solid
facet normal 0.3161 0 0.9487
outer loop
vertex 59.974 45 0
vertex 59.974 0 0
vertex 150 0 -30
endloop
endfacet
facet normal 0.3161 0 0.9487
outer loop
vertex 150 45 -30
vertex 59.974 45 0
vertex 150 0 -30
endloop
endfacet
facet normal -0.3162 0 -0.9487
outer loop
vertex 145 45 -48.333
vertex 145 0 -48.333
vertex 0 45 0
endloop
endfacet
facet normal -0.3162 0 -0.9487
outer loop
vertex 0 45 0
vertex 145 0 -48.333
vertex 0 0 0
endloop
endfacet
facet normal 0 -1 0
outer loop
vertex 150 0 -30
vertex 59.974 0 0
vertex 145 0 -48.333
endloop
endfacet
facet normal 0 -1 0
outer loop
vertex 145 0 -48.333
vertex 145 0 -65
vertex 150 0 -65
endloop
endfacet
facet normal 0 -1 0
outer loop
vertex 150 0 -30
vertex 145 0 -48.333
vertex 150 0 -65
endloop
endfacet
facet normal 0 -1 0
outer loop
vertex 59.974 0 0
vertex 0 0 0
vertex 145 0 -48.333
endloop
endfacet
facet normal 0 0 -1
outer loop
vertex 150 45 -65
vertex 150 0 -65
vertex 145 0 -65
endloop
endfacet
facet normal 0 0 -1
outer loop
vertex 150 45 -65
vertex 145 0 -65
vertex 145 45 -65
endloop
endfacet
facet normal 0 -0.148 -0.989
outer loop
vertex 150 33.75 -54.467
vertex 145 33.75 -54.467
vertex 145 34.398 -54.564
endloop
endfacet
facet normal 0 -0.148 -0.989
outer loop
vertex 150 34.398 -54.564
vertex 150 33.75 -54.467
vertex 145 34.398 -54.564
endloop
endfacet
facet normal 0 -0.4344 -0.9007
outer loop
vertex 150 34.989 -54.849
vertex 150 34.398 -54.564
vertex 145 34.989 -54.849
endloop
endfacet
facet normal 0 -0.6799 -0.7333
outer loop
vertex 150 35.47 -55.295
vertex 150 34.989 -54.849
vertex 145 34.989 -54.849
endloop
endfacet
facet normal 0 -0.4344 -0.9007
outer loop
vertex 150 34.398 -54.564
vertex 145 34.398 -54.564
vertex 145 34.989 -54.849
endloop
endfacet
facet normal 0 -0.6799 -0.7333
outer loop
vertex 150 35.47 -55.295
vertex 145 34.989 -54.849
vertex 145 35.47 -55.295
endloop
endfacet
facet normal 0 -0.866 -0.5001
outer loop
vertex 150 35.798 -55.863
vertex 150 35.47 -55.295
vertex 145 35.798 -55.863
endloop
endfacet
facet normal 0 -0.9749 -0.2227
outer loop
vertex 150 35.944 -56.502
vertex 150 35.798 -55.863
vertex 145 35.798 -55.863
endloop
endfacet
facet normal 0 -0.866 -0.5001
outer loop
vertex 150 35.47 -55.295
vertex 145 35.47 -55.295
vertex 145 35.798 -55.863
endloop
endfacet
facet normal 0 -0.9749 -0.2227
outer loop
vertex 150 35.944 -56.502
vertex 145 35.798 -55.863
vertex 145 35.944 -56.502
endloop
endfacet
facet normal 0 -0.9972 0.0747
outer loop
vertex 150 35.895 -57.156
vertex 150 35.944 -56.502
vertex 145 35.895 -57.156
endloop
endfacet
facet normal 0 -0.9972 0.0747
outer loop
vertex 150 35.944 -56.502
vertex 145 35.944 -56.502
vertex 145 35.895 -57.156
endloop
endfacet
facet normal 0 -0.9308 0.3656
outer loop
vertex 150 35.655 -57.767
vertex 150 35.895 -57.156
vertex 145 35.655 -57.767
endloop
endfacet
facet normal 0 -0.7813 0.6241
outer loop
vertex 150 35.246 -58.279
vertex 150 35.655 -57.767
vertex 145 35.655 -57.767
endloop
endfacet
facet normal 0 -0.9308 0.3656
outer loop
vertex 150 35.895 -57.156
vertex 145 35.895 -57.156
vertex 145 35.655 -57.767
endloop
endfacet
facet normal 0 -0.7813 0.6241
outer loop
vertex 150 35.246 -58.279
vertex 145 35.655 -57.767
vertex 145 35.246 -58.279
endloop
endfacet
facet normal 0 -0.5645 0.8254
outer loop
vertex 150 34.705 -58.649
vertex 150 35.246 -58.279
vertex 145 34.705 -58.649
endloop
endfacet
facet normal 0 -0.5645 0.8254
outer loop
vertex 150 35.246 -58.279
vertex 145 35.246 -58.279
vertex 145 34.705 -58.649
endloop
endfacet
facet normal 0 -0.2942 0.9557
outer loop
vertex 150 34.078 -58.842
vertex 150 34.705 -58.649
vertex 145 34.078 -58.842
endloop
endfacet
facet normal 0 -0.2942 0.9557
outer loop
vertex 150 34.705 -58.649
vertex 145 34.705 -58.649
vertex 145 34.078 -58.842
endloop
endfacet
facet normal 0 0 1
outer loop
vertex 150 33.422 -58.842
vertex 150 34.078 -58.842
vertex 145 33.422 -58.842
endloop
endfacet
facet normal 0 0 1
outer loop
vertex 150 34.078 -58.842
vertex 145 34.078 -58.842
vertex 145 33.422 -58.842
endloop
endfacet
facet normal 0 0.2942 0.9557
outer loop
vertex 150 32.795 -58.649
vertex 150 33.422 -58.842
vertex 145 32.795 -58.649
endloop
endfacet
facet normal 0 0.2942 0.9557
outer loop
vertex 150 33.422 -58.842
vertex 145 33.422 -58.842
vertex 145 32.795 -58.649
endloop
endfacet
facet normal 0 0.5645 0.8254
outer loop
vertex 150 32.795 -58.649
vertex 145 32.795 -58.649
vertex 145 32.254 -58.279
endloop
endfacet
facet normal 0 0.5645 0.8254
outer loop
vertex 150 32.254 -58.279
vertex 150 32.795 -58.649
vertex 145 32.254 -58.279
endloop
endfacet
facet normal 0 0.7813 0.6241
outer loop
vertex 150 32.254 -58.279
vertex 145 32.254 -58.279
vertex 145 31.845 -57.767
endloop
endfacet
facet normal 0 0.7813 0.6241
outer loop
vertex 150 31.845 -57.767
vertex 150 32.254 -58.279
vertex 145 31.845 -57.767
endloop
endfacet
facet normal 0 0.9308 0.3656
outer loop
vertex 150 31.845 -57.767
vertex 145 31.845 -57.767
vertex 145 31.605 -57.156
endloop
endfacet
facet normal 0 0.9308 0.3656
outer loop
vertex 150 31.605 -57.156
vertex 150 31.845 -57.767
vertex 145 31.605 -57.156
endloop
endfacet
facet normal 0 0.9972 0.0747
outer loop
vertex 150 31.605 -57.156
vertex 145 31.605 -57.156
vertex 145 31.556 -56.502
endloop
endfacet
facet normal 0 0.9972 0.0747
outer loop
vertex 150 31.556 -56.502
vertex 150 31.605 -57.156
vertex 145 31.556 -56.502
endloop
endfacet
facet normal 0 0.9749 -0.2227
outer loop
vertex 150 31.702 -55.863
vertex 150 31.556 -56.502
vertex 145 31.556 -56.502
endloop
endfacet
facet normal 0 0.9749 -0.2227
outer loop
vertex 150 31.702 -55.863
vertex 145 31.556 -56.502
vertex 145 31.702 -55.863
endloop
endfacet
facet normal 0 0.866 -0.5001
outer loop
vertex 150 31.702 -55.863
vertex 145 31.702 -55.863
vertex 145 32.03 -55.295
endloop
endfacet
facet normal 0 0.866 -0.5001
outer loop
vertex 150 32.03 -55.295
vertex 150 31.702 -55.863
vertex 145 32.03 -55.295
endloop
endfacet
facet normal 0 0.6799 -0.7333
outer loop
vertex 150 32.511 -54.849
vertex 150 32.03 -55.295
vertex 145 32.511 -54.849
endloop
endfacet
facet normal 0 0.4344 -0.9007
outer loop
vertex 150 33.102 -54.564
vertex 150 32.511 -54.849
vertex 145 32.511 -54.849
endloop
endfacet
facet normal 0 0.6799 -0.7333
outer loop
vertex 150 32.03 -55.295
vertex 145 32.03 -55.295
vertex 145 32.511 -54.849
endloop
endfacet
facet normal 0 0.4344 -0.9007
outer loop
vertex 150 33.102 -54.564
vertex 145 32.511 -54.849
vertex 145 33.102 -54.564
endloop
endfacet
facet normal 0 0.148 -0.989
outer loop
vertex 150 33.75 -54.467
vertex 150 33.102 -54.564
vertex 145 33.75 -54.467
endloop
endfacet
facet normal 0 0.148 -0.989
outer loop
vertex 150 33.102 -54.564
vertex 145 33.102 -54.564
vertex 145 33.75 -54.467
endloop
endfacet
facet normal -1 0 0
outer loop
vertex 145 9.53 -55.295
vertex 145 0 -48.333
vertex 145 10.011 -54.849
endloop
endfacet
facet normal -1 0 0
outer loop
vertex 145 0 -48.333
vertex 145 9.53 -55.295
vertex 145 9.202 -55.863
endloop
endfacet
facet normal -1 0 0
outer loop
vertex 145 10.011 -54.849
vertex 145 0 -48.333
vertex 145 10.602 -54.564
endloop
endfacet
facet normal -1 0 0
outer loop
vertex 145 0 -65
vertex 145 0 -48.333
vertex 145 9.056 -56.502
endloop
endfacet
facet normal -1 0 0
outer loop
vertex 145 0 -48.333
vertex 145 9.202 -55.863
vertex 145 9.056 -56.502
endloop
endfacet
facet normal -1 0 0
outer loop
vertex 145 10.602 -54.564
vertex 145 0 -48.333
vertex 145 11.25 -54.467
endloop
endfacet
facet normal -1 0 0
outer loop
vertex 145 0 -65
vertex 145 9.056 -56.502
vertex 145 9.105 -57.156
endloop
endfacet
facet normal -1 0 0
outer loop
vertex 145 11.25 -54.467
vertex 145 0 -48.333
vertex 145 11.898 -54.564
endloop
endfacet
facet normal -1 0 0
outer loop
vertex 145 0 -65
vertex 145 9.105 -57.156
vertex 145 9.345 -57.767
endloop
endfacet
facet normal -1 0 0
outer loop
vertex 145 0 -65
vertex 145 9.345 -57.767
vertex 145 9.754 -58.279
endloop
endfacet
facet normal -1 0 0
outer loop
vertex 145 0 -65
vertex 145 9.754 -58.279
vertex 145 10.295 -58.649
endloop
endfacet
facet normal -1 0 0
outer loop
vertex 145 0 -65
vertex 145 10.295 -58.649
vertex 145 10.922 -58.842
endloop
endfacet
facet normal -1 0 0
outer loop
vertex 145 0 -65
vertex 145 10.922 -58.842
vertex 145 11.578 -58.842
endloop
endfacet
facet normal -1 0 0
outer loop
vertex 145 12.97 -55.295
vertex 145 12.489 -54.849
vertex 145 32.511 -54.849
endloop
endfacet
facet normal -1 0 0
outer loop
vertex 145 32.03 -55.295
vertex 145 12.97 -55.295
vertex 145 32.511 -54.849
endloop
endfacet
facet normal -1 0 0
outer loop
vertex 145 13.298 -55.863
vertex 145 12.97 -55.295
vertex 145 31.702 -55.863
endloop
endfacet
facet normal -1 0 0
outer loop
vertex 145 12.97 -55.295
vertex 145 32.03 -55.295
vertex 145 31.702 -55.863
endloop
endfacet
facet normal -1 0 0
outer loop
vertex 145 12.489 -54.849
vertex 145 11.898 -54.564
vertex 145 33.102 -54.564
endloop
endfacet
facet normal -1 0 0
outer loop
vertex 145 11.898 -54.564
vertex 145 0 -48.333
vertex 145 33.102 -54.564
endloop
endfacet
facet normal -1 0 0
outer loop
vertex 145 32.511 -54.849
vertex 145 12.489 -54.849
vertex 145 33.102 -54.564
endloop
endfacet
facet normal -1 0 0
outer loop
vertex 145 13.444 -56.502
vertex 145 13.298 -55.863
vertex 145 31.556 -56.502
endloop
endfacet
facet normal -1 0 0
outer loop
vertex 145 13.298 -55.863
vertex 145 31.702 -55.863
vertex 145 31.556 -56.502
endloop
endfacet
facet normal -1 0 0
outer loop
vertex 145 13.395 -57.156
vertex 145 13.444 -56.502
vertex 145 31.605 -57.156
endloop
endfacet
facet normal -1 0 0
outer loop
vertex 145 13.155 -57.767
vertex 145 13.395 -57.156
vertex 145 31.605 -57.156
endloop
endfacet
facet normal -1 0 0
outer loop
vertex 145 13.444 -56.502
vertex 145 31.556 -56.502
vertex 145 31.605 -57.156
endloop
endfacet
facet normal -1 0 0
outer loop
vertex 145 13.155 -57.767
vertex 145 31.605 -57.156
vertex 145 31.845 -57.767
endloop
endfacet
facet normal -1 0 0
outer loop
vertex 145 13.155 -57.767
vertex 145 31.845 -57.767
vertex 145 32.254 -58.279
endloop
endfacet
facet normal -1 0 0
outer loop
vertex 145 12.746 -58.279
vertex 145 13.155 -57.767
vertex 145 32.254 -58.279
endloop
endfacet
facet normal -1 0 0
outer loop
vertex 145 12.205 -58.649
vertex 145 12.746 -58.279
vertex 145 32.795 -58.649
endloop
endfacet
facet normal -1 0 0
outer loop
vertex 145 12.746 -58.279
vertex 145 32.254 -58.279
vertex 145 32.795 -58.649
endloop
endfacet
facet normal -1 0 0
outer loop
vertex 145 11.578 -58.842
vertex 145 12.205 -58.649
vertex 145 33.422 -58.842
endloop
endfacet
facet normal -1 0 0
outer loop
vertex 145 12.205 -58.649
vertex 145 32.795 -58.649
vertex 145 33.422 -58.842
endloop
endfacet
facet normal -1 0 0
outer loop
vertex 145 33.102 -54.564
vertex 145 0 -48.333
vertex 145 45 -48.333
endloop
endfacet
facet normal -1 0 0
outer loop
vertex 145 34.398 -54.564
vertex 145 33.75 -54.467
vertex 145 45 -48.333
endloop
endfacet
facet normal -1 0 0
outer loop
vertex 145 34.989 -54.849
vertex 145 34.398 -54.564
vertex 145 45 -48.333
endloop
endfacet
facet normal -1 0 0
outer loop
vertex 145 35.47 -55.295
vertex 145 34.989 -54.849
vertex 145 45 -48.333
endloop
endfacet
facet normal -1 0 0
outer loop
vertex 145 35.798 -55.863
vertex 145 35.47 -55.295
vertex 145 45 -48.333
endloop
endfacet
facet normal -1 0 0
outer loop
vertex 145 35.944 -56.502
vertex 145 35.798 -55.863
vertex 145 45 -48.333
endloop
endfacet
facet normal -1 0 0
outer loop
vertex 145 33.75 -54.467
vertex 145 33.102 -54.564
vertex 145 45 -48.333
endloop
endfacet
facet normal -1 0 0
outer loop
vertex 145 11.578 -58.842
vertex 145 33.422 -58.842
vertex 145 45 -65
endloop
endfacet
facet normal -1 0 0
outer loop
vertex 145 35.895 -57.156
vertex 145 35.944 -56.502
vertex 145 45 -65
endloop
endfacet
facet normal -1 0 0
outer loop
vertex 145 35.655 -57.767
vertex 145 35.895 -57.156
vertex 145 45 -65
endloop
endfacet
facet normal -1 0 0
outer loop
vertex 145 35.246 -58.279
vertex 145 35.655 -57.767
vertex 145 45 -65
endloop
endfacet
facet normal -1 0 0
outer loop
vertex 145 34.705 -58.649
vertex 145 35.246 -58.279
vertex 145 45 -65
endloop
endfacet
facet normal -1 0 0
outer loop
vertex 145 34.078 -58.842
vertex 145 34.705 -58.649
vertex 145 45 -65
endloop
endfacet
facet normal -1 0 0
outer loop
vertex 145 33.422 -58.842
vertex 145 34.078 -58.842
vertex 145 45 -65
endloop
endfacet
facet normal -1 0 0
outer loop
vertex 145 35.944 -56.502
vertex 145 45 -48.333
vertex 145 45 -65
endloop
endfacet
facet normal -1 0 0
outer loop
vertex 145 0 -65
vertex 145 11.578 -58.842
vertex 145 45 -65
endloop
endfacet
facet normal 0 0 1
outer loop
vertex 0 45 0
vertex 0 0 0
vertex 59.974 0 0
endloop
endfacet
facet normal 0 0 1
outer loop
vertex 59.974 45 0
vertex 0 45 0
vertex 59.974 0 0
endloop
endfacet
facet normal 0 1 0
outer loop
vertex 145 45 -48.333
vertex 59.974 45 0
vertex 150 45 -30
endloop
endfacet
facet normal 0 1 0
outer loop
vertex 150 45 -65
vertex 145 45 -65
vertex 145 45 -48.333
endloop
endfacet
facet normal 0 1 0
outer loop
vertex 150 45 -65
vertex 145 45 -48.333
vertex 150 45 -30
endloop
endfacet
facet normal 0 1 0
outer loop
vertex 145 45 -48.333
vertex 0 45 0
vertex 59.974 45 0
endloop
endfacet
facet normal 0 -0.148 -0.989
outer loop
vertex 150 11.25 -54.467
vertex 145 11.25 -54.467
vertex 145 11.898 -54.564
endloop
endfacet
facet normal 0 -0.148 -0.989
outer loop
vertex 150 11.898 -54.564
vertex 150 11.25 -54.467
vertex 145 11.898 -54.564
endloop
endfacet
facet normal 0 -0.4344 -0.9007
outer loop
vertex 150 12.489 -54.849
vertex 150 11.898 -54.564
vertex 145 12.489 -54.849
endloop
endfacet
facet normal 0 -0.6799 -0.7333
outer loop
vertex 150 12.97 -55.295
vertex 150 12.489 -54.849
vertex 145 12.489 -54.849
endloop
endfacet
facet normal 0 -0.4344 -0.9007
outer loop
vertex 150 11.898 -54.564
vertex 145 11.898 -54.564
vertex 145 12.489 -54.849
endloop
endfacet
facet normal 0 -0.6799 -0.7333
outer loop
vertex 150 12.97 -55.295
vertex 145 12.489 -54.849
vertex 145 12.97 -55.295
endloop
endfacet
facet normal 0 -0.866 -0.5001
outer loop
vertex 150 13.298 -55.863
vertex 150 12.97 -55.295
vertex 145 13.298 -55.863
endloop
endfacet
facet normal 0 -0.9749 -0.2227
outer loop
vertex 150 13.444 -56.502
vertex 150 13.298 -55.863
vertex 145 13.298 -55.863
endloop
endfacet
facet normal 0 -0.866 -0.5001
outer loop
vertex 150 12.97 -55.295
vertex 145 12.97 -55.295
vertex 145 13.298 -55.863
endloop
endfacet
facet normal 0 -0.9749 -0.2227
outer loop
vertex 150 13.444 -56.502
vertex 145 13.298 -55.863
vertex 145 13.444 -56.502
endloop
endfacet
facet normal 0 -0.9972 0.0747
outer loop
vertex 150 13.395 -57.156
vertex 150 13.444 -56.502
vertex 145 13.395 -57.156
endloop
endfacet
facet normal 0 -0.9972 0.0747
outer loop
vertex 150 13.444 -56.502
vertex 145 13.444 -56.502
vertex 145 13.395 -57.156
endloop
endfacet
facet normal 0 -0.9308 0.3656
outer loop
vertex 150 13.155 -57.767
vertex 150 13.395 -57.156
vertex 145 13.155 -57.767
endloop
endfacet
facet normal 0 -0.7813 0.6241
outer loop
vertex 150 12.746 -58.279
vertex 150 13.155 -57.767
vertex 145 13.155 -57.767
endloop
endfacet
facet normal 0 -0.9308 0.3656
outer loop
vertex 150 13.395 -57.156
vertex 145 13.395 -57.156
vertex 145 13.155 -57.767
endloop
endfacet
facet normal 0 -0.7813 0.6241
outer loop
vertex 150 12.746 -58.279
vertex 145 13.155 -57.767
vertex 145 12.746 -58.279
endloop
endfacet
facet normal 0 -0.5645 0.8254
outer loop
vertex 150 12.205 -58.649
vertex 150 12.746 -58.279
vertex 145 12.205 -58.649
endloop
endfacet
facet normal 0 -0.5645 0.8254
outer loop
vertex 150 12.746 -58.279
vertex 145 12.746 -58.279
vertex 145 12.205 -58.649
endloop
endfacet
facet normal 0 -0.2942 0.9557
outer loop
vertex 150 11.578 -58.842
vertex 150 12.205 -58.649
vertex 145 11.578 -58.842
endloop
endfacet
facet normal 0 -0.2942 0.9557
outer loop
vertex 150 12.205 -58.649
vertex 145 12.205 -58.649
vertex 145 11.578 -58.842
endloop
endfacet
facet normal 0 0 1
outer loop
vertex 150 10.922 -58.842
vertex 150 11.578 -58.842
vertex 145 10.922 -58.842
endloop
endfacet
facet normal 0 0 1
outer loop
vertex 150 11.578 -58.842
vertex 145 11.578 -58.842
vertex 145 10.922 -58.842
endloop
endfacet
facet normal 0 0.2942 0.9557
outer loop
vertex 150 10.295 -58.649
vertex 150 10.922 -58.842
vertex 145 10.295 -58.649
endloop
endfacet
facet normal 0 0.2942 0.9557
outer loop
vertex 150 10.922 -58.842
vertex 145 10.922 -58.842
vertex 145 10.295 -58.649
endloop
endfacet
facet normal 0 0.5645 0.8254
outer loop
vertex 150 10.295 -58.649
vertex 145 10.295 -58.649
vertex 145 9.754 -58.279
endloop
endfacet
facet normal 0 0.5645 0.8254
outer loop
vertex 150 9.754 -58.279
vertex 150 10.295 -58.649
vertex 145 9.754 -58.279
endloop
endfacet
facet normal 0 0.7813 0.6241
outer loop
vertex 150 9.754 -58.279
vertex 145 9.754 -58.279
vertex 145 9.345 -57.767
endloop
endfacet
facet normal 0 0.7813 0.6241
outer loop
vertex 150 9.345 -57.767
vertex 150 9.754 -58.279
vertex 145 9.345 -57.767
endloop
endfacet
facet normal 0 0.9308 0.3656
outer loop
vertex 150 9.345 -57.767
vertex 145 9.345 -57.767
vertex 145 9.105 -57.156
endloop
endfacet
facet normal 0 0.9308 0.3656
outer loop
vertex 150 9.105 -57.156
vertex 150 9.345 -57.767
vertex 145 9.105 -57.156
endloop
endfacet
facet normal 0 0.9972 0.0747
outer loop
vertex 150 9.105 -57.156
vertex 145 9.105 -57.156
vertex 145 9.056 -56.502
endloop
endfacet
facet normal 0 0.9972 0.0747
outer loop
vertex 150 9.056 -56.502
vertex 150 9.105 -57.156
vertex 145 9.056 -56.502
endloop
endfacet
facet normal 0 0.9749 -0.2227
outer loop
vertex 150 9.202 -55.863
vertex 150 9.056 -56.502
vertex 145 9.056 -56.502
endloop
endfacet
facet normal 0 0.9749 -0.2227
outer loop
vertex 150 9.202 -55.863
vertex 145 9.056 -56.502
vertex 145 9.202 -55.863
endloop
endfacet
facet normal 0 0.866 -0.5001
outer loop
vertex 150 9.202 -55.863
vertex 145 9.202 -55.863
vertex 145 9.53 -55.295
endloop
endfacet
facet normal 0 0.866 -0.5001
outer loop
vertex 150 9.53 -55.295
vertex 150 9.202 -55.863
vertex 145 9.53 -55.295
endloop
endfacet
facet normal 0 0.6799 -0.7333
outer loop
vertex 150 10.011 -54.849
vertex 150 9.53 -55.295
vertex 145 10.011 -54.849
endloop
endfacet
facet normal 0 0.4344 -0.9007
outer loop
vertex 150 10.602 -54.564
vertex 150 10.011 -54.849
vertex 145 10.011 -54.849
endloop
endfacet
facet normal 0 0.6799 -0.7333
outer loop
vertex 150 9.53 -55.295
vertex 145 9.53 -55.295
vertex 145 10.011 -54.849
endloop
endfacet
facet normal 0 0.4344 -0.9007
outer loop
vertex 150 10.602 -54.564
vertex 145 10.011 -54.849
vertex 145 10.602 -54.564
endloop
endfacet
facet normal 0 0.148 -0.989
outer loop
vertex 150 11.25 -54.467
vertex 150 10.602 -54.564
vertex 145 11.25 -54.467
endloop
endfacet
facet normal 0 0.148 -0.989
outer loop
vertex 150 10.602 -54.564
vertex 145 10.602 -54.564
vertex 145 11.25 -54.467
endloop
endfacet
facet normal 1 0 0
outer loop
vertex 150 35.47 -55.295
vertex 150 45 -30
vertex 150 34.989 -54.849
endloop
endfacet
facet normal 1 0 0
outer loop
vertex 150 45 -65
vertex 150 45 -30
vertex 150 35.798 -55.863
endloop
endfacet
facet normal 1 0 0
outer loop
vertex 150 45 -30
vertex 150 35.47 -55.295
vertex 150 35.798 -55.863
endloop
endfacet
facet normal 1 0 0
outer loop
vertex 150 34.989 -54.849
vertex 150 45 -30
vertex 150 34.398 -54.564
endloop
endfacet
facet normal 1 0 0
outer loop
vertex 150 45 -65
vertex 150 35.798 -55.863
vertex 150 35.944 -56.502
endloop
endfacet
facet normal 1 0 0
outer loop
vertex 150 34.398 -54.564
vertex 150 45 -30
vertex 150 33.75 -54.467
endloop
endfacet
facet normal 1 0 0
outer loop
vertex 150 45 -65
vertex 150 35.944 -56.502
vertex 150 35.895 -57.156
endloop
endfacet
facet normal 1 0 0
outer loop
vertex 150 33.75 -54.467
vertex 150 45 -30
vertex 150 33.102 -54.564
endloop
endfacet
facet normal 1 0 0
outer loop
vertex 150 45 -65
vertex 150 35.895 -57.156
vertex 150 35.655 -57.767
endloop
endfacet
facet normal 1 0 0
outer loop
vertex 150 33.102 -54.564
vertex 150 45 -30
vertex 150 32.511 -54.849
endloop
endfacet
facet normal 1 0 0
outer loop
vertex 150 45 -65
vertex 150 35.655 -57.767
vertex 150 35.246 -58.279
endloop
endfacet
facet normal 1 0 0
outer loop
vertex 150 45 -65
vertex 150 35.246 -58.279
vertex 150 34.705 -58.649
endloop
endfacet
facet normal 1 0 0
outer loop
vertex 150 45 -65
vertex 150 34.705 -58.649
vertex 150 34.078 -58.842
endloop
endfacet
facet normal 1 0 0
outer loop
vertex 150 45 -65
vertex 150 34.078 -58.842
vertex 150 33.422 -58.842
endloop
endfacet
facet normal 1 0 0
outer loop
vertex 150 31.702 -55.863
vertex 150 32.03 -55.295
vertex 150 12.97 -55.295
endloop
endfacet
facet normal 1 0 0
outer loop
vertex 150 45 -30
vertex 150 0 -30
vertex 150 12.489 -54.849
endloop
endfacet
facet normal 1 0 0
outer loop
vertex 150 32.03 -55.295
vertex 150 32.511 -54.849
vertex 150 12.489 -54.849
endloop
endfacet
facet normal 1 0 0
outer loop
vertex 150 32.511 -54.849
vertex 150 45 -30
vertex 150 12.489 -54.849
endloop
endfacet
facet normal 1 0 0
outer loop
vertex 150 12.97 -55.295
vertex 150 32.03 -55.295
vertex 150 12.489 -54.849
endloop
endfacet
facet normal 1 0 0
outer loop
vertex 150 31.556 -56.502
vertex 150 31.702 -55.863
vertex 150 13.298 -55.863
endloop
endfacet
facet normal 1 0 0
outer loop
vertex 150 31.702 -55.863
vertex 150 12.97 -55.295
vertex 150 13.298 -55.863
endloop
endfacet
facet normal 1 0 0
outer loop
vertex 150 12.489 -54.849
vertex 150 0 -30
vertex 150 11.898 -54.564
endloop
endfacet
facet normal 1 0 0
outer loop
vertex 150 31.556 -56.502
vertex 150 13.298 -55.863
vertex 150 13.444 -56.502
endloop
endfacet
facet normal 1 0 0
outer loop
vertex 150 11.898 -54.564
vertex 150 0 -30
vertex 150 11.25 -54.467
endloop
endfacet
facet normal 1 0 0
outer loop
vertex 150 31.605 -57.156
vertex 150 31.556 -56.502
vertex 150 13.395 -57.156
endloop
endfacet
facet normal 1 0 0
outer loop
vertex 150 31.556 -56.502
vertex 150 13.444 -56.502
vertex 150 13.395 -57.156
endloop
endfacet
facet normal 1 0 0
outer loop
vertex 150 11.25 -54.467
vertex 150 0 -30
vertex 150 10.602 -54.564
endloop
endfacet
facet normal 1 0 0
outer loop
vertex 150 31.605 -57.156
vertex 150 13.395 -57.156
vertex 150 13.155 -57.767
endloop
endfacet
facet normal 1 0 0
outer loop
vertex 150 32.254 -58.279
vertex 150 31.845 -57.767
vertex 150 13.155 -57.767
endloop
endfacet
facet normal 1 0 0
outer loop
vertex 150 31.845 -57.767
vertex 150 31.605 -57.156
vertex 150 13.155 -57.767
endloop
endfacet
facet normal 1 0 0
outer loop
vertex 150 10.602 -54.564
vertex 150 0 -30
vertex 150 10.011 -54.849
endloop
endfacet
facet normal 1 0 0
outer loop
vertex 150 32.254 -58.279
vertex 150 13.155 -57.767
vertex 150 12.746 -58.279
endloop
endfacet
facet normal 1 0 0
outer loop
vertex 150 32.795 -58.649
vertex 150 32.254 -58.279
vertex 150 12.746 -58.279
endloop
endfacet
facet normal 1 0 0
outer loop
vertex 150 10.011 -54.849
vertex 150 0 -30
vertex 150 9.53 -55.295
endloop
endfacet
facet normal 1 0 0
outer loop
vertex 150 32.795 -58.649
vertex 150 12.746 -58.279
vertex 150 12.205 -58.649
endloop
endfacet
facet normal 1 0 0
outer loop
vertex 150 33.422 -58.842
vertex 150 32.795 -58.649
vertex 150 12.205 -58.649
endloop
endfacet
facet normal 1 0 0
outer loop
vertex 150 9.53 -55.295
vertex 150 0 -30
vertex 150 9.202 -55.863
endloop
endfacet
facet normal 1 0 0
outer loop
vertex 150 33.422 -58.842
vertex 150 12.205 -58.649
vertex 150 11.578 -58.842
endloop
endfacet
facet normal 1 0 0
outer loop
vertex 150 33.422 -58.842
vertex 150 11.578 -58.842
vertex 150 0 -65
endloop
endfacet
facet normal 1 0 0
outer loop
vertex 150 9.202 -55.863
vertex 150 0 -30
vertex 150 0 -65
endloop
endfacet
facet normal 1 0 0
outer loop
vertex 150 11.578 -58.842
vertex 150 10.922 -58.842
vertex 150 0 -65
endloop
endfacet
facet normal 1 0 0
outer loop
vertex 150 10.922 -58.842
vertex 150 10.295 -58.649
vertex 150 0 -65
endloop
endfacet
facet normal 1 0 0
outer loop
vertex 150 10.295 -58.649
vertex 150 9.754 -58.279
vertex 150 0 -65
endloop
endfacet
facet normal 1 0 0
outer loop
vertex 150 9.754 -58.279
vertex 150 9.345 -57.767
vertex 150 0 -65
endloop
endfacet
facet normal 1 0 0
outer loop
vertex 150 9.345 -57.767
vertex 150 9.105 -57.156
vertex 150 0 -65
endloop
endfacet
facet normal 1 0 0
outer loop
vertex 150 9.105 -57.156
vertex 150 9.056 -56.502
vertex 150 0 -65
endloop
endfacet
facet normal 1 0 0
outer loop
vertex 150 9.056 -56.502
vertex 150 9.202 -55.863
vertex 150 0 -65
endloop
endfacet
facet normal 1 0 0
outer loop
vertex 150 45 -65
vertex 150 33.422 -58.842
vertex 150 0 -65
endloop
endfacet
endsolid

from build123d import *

# Parameters (mm, degrees)
BOSS_EXTRUDE1_DEPTH = 45
SKETCH2_W           = 35
SKETCH2_H           = 45
BOSS_EXTRUDE2_DEPTH = 5
SKETCH3_R           = 2.2
CUT_EXTRUDE1_DEPTH  = 5


with BuildPart() as part:
    # Sketch1 → Boss-Extrude1 (new body)
    with BuildSketch(Plane(origin=(0, 0, 0), x_dir=(1, 0, 0), z_dir=(0, 1, 0))):
        Polygon((150, 50), (0, 0), (59.974081308, 0), (150, 30), align=None)
    extrude(amount=BOSS_EXTRUDE1_DEPTH)

    # Sketch2 → Boss-Extrude2 (add)
    with BuildSketch(Plane(origin=(150, 0, 0), x_dir=(0, 0, -1), z_dir=(1, 0, 0))):
        with Locations((47.5, 22.5)):
            Rectangle(SKETCH2_W, SKETCH2_H)
    extrude(amount=-BOSS_EXTRUDE2_DEPTH)

    # Sketch3 → Cut-Extrude1 (cut)
    with BuildSketch(Plane.ZY.offset(-145)):
        with Locations((-56.666666667, 33.75)):
            Circle(SKETCH3_R)
        with Locations((-56.666666667, 11.25)):
            Circle(SKETCH3_R)
    extrude(amount=-CUT_EXTRUDE1_DEPTH, mode=Mode.SUBTRACT)


solid = part.part
